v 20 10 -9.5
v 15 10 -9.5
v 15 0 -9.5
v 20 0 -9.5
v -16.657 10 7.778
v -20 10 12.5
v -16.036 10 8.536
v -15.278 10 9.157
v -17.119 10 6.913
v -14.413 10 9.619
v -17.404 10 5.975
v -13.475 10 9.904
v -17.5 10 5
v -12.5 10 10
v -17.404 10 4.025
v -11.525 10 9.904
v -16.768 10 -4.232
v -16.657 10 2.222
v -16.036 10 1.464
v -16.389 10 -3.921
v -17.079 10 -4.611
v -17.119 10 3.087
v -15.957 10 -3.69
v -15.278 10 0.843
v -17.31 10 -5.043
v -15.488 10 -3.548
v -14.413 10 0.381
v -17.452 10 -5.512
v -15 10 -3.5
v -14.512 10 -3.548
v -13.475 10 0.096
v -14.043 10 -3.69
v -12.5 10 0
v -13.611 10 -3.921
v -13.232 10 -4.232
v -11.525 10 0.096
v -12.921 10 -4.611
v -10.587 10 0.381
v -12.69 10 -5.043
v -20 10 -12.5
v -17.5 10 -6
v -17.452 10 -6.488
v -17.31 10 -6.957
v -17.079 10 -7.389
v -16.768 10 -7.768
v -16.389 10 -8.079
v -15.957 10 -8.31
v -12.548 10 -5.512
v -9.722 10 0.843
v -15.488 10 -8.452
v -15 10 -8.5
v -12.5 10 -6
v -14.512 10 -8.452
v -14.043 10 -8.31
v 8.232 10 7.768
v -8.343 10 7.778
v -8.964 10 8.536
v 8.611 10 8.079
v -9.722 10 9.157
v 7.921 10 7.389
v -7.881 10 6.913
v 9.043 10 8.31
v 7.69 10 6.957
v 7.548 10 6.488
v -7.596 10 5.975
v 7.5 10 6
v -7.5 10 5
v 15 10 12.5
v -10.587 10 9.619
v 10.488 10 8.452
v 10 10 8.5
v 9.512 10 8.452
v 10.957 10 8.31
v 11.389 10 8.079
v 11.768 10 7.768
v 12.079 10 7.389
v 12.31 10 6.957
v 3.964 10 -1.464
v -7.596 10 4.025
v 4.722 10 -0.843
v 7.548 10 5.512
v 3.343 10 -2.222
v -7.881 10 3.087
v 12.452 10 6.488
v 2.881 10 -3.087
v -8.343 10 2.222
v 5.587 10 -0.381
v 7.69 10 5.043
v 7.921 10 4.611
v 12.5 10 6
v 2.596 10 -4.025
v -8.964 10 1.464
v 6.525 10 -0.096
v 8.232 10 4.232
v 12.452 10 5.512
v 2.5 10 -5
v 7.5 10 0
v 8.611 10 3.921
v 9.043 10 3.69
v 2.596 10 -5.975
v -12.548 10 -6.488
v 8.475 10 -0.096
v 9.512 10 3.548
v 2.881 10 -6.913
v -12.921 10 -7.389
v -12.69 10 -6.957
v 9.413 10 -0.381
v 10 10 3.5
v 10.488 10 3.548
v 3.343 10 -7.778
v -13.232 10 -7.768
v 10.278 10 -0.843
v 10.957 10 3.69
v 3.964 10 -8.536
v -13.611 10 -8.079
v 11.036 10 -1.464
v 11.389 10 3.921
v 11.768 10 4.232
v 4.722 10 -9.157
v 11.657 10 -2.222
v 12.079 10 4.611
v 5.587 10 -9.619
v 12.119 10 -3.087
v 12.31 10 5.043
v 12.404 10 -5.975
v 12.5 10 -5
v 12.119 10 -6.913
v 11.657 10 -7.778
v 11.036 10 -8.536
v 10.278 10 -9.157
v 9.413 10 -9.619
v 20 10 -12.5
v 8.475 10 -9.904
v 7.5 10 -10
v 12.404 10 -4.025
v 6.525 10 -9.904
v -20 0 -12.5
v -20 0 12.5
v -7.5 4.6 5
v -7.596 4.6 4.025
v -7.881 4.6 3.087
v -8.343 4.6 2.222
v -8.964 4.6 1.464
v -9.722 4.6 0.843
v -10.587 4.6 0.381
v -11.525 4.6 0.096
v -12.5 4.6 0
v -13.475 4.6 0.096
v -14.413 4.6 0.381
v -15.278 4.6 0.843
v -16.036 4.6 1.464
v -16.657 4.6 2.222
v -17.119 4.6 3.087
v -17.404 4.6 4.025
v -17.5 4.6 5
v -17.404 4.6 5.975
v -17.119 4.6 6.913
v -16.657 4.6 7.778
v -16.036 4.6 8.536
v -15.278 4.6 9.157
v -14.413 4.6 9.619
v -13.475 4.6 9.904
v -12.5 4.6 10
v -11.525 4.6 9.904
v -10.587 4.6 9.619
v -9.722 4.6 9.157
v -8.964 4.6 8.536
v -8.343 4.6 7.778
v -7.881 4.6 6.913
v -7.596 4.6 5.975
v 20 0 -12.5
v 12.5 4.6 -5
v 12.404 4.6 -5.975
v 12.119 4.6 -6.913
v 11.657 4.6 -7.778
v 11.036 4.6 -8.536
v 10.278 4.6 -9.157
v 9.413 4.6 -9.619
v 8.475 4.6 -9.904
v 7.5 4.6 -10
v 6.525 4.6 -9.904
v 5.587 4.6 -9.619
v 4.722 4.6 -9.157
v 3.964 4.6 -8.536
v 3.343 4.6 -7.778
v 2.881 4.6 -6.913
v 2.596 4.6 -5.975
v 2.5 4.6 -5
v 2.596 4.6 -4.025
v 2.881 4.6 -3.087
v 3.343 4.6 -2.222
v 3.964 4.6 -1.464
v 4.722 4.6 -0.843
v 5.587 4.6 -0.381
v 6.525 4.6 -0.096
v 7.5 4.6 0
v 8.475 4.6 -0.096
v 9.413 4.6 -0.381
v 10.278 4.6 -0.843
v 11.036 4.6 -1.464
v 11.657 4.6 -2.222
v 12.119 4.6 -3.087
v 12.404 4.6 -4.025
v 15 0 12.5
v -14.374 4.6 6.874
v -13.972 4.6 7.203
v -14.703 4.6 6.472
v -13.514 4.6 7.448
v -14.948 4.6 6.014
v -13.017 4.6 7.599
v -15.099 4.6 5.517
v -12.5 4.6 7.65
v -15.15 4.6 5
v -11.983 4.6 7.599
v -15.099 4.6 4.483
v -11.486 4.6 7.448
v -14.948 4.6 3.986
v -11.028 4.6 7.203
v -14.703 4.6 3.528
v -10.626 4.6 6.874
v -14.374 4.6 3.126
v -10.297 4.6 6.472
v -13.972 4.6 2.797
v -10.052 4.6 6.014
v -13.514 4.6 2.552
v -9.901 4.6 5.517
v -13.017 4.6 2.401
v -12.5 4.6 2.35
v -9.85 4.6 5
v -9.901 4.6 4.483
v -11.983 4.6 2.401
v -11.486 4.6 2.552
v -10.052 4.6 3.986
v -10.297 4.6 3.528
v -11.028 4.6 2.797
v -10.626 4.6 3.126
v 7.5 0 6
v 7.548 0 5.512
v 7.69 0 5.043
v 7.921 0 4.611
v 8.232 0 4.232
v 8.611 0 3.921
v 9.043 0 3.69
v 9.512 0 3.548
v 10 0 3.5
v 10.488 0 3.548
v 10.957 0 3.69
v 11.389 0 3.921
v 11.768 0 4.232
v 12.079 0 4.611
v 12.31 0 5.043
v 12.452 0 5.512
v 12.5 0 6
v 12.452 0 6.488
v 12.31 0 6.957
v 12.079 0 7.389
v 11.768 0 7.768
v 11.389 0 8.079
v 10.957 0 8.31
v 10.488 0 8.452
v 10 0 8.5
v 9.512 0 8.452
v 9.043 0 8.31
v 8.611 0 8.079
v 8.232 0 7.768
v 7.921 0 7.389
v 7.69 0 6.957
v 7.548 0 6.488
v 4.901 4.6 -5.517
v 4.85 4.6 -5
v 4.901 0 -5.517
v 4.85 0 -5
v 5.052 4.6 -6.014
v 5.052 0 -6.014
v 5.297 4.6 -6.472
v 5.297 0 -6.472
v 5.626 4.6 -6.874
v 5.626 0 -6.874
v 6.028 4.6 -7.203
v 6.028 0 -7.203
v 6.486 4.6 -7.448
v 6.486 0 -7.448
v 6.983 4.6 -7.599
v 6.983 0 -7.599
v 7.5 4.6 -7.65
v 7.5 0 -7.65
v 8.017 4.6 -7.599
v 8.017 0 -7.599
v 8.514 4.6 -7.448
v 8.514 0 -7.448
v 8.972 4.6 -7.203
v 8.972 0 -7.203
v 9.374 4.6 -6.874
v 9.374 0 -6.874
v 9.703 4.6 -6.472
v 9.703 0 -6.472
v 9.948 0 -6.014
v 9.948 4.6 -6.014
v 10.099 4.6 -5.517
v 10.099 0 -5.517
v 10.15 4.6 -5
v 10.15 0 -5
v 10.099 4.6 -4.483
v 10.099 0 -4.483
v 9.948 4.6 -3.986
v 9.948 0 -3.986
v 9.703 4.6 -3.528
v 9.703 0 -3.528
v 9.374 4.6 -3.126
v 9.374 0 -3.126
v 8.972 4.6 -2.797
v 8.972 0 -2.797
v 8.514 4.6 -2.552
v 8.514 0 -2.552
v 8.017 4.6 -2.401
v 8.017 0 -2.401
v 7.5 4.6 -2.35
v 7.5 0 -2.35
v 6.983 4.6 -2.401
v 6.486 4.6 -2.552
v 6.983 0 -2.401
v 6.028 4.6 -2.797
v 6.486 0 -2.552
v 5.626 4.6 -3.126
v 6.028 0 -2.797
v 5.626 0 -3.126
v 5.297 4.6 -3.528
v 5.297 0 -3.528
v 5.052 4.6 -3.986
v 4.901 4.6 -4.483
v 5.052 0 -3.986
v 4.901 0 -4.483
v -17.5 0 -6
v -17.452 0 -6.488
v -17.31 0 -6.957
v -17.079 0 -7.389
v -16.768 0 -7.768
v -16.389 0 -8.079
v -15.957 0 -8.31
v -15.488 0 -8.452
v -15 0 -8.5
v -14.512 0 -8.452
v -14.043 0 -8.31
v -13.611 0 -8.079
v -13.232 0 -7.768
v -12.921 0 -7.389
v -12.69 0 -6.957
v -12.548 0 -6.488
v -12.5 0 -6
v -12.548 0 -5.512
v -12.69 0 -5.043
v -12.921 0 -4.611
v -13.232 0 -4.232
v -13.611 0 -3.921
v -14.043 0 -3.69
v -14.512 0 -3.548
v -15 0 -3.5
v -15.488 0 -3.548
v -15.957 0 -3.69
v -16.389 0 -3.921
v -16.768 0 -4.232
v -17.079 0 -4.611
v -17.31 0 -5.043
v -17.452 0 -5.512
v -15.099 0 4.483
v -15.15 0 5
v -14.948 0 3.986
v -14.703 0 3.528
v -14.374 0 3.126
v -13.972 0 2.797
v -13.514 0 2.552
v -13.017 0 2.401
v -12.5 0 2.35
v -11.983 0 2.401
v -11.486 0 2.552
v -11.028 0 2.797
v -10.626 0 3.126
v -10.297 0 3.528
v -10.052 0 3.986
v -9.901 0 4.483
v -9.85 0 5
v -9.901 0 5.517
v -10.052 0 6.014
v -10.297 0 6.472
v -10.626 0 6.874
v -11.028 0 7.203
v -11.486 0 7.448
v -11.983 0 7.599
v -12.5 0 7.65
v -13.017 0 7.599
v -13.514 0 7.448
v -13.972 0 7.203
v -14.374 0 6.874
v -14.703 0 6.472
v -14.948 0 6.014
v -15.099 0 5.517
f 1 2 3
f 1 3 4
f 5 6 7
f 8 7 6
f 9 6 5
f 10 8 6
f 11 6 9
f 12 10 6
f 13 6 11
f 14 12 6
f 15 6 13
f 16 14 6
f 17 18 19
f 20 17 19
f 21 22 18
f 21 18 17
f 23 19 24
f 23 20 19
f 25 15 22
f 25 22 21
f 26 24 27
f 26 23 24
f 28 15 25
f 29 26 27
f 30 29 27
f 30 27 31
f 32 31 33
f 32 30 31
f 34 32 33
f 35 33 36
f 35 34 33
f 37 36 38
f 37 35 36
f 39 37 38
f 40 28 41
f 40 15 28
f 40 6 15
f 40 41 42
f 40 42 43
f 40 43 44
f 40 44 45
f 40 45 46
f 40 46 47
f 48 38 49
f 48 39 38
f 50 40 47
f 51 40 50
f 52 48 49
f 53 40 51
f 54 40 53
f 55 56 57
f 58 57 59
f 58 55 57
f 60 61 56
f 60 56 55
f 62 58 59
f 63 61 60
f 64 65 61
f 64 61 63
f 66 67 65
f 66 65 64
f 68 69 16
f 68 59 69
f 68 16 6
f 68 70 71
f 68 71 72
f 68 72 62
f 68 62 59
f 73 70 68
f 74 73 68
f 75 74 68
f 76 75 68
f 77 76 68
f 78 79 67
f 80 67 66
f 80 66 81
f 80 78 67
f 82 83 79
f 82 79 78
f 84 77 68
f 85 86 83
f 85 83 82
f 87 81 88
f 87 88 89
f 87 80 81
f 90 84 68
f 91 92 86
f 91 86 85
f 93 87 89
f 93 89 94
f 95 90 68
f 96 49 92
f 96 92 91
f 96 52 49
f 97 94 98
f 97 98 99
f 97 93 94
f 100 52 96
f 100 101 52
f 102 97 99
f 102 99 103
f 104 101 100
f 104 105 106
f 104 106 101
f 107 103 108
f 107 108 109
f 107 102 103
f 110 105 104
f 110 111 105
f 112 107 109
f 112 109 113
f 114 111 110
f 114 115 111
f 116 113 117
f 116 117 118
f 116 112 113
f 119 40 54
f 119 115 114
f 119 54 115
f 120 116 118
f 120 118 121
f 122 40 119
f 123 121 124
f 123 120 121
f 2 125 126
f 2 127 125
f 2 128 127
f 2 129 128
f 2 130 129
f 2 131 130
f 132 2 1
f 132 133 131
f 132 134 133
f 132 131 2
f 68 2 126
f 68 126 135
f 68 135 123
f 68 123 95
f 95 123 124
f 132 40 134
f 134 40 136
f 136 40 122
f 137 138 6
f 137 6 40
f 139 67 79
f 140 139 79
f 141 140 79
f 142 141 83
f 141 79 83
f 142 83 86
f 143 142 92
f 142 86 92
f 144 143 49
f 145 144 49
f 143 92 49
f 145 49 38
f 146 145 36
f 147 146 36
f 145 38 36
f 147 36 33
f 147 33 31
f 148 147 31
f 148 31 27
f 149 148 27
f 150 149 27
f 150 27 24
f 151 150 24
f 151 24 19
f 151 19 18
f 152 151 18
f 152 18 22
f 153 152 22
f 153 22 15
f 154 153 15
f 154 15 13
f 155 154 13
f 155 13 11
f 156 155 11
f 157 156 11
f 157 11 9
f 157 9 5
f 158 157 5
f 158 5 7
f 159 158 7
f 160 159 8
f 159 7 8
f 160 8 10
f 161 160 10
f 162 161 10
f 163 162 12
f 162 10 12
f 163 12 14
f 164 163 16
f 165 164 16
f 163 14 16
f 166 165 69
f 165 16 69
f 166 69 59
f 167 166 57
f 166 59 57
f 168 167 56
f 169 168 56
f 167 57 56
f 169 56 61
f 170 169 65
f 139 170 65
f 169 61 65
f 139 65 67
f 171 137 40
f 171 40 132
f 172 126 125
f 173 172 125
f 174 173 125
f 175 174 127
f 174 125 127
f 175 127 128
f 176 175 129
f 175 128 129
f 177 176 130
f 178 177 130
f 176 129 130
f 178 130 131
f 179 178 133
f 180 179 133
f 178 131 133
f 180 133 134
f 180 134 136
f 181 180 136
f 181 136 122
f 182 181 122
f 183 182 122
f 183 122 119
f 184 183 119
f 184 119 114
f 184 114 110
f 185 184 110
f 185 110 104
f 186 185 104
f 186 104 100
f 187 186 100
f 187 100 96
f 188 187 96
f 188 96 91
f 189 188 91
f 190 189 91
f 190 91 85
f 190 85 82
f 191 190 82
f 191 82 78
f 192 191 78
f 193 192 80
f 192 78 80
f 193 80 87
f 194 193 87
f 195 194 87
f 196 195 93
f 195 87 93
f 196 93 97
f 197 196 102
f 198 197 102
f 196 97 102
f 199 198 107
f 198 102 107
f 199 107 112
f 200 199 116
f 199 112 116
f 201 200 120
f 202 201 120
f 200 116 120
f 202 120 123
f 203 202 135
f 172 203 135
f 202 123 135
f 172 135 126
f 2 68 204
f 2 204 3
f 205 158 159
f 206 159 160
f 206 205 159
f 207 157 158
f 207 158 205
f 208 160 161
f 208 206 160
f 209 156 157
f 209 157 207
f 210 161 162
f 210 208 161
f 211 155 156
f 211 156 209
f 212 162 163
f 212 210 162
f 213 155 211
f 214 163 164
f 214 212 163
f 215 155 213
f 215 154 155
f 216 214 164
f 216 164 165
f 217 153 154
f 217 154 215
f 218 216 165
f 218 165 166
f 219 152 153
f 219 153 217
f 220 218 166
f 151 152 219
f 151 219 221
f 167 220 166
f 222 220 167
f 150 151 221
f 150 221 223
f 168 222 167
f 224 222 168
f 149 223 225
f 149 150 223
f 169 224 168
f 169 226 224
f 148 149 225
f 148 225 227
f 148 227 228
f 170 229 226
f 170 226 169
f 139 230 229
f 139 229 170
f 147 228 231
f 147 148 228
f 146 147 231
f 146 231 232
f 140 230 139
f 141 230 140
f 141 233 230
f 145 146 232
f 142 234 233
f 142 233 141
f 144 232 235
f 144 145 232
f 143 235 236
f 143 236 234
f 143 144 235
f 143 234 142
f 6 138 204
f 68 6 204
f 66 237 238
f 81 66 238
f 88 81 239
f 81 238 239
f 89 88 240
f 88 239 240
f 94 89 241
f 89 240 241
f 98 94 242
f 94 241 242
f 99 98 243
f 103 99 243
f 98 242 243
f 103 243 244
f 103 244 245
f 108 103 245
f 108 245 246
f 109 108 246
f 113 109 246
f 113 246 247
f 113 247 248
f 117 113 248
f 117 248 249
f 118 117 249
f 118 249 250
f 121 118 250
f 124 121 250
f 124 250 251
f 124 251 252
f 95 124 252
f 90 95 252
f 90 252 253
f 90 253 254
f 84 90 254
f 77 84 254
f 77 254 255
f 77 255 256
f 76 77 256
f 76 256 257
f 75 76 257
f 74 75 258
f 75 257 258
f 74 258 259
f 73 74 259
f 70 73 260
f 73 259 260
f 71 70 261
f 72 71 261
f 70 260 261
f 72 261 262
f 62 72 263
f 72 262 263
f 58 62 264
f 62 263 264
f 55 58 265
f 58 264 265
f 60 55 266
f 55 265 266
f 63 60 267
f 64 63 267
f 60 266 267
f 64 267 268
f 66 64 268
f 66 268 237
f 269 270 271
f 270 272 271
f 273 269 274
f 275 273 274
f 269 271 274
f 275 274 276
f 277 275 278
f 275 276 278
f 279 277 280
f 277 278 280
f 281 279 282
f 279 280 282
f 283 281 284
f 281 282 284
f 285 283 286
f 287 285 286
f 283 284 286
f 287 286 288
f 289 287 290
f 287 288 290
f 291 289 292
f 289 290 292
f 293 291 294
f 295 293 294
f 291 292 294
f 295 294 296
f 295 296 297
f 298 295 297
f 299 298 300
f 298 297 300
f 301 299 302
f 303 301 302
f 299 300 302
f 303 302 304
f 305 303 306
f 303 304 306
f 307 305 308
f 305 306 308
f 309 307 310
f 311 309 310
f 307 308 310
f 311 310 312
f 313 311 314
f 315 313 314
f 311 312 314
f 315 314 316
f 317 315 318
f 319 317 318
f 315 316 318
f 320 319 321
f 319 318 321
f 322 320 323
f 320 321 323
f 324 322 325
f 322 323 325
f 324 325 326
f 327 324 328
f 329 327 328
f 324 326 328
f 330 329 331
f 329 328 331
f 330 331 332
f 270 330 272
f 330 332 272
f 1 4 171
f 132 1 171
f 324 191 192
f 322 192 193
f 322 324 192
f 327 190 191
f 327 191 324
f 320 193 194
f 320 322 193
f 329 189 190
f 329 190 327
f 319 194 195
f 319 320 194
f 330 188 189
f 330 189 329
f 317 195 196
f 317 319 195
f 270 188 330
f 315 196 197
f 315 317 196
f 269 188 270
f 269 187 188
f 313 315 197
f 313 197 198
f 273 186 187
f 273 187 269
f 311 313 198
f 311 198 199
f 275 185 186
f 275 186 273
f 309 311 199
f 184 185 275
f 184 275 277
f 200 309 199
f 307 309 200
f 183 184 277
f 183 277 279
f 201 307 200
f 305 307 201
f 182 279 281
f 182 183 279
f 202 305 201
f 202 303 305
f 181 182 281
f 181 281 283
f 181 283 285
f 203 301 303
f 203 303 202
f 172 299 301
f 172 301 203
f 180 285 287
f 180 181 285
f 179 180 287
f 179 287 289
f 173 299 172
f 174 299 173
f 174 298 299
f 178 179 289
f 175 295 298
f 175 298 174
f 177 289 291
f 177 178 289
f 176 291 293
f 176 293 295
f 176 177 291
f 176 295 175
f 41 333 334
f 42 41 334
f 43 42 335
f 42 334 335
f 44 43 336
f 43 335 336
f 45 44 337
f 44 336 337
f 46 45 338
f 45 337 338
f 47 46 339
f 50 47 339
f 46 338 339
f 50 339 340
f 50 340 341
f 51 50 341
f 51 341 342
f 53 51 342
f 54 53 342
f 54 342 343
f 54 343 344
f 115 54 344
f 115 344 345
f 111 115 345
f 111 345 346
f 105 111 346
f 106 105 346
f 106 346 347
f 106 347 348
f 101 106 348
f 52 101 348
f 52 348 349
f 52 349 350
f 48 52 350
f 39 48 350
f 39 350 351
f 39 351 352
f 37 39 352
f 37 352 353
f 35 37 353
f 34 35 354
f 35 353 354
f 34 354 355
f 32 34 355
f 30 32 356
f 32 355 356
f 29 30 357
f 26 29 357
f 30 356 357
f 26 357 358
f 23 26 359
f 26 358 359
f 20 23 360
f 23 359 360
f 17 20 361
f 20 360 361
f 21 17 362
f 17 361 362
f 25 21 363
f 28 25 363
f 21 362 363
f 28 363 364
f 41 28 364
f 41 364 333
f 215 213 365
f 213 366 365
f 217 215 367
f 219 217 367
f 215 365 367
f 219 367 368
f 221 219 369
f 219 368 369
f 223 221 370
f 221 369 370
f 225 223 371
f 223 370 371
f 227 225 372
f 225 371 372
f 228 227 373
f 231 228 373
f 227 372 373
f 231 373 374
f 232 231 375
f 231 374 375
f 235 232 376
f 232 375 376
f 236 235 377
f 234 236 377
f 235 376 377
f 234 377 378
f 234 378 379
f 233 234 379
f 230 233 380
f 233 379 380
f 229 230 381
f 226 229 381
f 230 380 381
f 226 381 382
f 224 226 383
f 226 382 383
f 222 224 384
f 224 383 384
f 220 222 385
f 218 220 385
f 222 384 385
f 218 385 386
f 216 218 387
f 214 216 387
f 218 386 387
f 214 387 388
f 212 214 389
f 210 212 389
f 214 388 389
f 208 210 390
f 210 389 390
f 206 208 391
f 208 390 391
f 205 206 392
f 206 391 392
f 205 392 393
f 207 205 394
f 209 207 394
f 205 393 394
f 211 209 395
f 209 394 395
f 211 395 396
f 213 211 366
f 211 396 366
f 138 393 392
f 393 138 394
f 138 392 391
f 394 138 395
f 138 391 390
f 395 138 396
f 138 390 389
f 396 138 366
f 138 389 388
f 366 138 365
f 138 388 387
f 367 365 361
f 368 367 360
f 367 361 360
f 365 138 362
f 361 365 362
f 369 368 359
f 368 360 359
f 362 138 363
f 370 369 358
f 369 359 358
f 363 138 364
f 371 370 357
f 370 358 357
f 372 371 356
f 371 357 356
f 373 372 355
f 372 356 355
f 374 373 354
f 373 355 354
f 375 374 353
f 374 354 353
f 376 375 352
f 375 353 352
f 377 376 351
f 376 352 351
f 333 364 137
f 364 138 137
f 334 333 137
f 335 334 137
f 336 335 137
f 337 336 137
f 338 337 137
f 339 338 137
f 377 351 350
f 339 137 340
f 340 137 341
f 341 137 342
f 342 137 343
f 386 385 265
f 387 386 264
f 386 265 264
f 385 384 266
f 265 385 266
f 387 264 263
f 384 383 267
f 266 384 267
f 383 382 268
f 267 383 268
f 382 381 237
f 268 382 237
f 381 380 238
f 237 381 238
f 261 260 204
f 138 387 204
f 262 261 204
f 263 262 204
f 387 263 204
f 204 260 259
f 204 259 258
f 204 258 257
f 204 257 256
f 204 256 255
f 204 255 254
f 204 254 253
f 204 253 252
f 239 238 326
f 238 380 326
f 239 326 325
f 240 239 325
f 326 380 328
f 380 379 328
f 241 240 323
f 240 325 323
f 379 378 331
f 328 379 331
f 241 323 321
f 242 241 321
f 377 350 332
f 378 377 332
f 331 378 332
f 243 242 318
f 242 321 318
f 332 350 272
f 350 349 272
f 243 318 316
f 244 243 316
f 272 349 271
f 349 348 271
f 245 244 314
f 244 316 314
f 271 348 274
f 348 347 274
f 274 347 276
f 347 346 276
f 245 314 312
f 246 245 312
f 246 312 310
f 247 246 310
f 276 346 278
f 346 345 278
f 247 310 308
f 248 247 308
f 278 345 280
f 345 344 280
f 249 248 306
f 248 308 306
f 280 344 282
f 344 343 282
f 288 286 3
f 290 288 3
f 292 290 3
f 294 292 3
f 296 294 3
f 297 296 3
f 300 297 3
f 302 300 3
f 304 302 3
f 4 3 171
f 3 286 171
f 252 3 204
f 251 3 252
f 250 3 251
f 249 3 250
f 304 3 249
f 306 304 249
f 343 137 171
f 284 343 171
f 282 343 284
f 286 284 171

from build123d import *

# Parameters (mm, degrees)
SKETCH1_W                                           = 40
SKETCH1_H                                           = 25
BOSS_EXTRUDE1_DEPTH                                 = 10
CUT_EXTRUDE2_REACH                                  = 27.617
SKETCH3_W                                           = 5
SKETCH3_H                                           = 22
F_5_0MM_DOWEL_HOLE1_D                               = 5
CBORE_FOR_M5_HEX_SOCKET_HEAD_CAP_SCREW1_D           = 5.3
CBORE_FOR_M5_HEX_SOCKET_HEAD_CAP_SCREW1_CBORE_D     = 10
CBORE_FOR_M5_HEX_SOCKET_HEAD_CAP_SCREW1_CBORE_DEPTH = 5.4


with BuildPart() as part:
    # Sketch1 → Boss-Extrude1 (new body)
    with BuildSketch(Plane(origin=(0, 0, 0), x_dir=(1, 0, 0), z_dir=(0, 1, 0))):
        Rectangle(SKETCH1_W, SKETCH1_H)
    extrude(amount=BOSS_EXTRUDE1_DEPTH)

    # Sketch3 → Cut-Extrude2 (cut, up to next)
    with BuildSketch(Plane(origin=(0, 10, 0), x_dir=(1, 0, 0), z_dir=(0, 1, 0)), mode=Mode.PRIVATE) as cut_extrude2_sk1:
        with Locations((17.5, -1.5)):
            Rectangle(SKETCH3_W, SKETCH3_H)
    cut_extrude2_tool1 = extrude(cut_extrude2_sk1.sketch, amount=-CUT_EXTRUDE2_REACH, mode=Mode.PRIVATE) & part.part
    add(cut_extrude2_tool1.solids().sort_by_distance((17.5, 10, 1.5))[0], mode=Mode.SUBTRACT)

    # Ø5.0mm Dowel Hole1 (through all)
    with Locations(Plane(origin=(0, 10, 0), x_dir=(1, 0, 0), z_dir=(0, 1, 0))):
        with Locations((-15, 6), (10, -6)):
            Hole(F_5_0MM_DOWEL_HOLE1_D / 2)

    # CBORE for M5 Hex Socket Head Cap Screw1 (through all)
    with Locations(Plane(origin=(0, 10, 0), x_dir=(1, 0, 0), z_dir=(0, 1, 0))):
        with Locations((-12.5, -5), (7.5, 5)):
            CounterBoreHole(CBORE_FOR_M5_HEX_SOCKET_HEAD_CAP_SCREW1_D / 2, CBORE_FOR_M5_HEX_SOCKET_HEAD_CAP_SCREW1_CBORE_D / 2, CBORE_FOR_M5_HEX_SOCKET_HEAD_CAP_SCREW1_CBORE_DEPTH)


solid = part.part
